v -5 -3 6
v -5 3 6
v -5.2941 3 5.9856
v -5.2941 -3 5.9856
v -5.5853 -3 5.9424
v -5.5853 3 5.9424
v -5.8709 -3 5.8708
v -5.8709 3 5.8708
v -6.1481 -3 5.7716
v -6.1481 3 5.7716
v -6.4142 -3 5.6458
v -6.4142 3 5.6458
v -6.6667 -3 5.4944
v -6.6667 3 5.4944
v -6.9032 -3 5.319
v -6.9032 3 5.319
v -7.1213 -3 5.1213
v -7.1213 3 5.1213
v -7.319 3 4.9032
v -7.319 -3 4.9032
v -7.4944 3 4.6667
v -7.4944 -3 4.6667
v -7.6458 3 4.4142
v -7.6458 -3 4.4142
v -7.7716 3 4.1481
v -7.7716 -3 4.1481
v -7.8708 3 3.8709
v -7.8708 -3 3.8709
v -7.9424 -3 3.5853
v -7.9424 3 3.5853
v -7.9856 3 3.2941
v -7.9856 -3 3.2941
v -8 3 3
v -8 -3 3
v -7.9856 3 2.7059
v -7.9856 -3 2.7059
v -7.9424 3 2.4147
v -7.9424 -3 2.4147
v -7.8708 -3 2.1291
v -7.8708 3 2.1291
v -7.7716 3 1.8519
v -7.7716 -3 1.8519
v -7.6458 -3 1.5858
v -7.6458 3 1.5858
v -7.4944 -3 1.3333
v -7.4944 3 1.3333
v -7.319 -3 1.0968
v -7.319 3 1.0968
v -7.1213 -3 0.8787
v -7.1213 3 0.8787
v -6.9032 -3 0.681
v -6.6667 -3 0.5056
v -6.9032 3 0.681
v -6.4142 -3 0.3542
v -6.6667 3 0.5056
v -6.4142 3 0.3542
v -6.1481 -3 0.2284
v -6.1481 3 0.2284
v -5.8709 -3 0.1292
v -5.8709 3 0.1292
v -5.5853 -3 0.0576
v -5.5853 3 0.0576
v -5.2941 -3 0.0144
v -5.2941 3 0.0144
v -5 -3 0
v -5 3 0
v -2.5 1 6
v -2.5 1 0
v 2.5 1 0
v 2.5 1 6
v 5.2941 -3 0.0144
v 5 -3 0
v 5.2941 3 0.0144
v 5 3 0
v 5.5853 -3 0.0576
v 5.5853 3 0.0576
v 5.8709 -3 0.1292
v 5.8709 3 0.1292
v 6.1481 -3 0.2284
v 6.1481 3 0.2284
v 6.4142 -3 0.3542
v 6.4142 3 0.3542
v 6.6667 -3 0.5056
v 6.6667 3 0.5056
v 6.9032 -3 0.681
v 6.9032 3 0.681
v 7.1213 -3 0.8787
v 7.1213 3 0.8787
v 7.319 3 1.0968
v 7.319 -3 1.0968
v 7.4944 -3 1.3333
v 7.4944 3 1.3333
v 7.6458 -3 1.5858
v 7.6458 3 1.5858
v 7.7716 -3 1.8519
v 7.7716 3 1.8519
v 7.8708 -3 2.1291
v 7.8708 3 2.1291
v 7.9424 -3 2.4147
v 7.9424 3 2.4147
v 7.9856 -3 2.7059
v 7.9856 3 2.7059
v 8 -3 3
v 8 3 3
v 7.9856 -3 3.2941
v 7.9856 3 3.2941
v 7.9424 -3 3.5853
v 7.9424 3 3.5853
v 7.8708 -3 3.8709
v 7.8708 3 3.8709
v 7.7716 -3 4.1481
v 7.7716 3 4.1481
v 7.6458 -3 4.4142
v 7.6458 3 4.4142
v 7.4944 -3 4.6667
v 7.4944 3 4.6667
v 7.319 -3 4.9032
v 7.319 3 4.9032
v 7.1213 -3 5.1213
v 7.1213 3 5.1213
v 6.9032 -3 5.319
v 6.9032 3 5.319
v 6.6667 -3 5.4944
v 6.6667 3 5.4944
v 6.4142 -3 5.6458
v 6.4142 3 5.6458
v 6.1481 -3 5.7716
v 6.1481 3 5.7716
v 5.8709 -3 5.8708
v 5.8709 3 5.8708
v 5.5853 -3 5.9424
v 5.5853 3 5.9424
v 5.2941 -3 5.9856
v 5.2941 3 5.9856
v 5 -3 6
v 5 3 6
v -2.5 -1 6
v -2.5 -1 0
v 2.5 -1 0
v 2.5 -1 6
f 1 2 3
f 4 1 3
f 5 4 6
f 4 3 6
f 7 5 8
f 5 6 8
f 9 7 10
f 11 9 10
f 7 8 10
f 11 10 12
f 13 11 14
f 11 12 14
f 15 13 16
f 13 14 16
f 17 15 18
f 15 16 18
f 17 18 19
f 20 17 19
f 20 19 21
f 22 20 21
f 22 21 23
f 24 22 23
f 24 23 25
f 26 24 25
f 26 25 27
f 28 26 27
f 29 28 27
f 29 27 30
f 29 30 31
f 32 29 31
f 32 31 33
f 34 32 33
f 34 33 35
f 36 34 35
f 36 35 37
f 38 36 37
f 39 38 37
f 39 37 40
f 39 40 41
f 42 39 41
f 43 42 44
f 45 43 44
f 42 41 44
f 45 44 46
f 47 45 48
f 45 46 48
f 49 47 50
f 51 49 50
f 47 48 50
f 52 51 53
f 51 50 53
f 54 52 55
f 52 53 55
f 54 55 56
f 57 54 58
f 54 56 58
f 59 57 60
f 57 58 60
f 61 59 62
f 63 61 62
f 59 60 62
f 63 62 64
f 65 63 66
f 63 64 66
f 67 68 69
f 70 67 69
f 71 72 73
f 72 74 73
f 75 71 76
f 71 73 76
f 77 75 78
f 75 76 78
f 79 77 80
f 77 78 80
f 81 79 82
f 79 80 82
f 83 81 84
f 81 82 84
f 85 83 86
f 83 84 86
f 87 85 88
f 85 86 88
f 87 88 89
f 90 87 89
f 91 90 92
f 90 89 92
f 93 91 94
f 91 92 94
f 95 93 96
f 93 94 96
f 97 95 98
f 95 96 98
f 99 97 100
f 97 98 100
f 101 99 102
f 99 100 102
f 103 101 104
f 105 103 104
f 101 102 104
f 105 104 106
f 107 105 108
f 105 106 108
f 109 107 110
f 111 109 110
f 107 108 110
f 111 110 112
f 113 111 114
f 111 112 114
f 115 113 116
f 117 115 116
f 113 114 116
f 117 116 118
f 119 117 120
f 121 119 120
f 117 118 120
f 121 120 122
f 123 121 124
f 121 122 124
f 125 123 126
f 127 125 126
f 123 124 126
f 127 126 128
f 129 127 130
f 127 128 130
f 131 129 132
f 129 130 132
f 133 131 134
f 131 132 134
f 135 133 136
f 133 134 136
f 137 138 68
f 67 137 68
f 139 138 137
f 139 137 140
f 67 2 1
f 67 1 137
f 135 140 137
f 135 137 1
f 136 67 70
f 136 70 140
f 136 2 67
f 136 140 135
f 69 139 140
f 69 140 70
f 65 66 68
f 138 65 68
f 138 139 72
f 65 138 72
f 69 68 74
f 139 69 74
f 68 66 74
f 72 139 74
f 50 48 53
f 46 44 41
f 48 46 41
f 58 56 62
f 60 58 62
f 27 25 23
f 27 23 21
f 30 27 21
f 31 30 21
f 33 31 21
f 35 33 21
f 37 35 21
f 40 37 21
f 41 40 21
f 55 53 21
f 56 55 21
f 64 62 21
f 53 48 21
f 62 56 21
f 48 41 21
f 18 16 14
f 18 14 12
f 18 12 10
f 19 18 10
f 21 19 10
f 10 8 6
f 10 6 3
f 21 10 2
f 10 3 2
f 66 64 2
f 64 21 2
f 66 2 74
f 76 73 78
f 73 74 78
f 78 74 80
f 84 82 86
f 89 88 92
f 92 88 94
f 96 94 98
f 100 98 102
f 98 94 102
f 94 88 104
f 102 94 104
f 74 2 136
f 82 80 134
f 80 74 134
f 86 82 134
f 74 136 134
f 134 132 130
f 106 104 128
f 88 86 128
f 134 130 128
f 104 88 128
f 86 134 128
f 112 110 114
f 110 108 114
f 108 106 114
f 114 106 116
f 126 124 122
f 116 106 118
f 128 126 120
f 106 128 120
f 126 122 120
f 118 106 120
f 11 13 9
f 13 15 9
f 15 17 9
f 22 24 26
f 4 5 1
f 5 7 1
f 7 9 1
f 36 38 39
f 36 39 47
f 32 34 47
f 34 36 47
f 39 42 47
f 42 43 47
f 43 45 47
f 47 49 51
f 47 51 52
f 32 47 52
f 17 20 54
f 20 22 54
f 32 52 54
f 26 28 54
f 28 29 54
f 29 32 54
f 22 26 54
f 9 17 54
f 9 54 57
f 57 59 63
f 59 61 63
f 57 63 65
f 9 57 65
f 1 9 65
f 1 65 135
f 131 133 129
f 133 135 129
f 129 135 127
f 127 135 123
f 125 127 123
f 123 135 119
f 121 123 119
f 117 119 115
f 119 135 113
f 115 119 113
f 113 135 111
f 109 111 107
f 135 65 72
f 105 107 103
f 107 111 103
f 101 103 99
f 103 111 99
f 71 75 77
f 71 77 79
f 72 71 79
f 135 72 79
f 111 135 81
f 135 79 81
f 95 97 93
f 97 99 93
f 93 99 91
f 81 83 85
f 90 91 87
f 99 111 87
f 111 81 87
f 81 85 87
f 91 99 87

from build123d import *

# Parameters (mm, degrees)
BOX001_W          = 5
BOX001_H          = 2
BOX001_DEPTH      = 6
CYLINDER001_R     = 3
CYLINDER001_DEPTH = 6
BOX_W             = 10
BOX_H             = 6
BOX_DEPTH         = 6
CYLINDER_R        = 3
CYLINDER_DEPTH    = 6


with BuildPart() as insert:
    # Box001 → Box001 (new body)
    with BuildSketch(Plane(origin=(-2.5, -1, 0), x_dir=(1, 0, 0), z_dir=(0, 0, 1))):
        with Locations((2.5, 1)):
            Rectangle(BOX001_W, BOX001_H)
    extrude(amount=BOX001_DEPTH)


with BuildPart() as sliderightside:
    # Cylinder001 → Cylinder001 (new body)
    with BuildSketch(Plane(origin=(5, 3, 0), x_dir=(1, 0, 0), z_dir=(0, -1, 0))):
        Circle(CYLINDER001_R)
    extrude(amount=CYLINDER001_DEPTH)


with BuildPart() as slidebox:
    # Box → Box (new body)
    with BuildSketch(Plane(origin=(-5, -3, -3), x_dir=(1, 0, 0), z_dir=(0, 0, 1))):
        with Locations((5, 3)):
            Rectangle(BOX_W, BOX_H)
    extrude(amount=BOX_DEPTH)


with BuildPart() as slidetotal:
    # Cylinder → Cylinder (new body)
    with BuildSketch(Plane(origin=(-5, 3, 0), x_dir=(1, 0, 0), z_dir=(0, -1, 0))):
        Circle(CYLINDER_R)
    extrude(amount=CYLINDER_DEPTH)

    # Fusion: union SlideRightSide, SlideBox
    add(sliderightside.part)
    add(slidebox.part)


with BuildPart() as slidetotal_1:
    # Fusion placement: moved
    add(slidetotal.part.moved(Location((0, 0, 3))))

    # Cut: cut Insert
    add(insert.part, mode=Mode.SUBTRACT)


solid = slidetotal_1.part
